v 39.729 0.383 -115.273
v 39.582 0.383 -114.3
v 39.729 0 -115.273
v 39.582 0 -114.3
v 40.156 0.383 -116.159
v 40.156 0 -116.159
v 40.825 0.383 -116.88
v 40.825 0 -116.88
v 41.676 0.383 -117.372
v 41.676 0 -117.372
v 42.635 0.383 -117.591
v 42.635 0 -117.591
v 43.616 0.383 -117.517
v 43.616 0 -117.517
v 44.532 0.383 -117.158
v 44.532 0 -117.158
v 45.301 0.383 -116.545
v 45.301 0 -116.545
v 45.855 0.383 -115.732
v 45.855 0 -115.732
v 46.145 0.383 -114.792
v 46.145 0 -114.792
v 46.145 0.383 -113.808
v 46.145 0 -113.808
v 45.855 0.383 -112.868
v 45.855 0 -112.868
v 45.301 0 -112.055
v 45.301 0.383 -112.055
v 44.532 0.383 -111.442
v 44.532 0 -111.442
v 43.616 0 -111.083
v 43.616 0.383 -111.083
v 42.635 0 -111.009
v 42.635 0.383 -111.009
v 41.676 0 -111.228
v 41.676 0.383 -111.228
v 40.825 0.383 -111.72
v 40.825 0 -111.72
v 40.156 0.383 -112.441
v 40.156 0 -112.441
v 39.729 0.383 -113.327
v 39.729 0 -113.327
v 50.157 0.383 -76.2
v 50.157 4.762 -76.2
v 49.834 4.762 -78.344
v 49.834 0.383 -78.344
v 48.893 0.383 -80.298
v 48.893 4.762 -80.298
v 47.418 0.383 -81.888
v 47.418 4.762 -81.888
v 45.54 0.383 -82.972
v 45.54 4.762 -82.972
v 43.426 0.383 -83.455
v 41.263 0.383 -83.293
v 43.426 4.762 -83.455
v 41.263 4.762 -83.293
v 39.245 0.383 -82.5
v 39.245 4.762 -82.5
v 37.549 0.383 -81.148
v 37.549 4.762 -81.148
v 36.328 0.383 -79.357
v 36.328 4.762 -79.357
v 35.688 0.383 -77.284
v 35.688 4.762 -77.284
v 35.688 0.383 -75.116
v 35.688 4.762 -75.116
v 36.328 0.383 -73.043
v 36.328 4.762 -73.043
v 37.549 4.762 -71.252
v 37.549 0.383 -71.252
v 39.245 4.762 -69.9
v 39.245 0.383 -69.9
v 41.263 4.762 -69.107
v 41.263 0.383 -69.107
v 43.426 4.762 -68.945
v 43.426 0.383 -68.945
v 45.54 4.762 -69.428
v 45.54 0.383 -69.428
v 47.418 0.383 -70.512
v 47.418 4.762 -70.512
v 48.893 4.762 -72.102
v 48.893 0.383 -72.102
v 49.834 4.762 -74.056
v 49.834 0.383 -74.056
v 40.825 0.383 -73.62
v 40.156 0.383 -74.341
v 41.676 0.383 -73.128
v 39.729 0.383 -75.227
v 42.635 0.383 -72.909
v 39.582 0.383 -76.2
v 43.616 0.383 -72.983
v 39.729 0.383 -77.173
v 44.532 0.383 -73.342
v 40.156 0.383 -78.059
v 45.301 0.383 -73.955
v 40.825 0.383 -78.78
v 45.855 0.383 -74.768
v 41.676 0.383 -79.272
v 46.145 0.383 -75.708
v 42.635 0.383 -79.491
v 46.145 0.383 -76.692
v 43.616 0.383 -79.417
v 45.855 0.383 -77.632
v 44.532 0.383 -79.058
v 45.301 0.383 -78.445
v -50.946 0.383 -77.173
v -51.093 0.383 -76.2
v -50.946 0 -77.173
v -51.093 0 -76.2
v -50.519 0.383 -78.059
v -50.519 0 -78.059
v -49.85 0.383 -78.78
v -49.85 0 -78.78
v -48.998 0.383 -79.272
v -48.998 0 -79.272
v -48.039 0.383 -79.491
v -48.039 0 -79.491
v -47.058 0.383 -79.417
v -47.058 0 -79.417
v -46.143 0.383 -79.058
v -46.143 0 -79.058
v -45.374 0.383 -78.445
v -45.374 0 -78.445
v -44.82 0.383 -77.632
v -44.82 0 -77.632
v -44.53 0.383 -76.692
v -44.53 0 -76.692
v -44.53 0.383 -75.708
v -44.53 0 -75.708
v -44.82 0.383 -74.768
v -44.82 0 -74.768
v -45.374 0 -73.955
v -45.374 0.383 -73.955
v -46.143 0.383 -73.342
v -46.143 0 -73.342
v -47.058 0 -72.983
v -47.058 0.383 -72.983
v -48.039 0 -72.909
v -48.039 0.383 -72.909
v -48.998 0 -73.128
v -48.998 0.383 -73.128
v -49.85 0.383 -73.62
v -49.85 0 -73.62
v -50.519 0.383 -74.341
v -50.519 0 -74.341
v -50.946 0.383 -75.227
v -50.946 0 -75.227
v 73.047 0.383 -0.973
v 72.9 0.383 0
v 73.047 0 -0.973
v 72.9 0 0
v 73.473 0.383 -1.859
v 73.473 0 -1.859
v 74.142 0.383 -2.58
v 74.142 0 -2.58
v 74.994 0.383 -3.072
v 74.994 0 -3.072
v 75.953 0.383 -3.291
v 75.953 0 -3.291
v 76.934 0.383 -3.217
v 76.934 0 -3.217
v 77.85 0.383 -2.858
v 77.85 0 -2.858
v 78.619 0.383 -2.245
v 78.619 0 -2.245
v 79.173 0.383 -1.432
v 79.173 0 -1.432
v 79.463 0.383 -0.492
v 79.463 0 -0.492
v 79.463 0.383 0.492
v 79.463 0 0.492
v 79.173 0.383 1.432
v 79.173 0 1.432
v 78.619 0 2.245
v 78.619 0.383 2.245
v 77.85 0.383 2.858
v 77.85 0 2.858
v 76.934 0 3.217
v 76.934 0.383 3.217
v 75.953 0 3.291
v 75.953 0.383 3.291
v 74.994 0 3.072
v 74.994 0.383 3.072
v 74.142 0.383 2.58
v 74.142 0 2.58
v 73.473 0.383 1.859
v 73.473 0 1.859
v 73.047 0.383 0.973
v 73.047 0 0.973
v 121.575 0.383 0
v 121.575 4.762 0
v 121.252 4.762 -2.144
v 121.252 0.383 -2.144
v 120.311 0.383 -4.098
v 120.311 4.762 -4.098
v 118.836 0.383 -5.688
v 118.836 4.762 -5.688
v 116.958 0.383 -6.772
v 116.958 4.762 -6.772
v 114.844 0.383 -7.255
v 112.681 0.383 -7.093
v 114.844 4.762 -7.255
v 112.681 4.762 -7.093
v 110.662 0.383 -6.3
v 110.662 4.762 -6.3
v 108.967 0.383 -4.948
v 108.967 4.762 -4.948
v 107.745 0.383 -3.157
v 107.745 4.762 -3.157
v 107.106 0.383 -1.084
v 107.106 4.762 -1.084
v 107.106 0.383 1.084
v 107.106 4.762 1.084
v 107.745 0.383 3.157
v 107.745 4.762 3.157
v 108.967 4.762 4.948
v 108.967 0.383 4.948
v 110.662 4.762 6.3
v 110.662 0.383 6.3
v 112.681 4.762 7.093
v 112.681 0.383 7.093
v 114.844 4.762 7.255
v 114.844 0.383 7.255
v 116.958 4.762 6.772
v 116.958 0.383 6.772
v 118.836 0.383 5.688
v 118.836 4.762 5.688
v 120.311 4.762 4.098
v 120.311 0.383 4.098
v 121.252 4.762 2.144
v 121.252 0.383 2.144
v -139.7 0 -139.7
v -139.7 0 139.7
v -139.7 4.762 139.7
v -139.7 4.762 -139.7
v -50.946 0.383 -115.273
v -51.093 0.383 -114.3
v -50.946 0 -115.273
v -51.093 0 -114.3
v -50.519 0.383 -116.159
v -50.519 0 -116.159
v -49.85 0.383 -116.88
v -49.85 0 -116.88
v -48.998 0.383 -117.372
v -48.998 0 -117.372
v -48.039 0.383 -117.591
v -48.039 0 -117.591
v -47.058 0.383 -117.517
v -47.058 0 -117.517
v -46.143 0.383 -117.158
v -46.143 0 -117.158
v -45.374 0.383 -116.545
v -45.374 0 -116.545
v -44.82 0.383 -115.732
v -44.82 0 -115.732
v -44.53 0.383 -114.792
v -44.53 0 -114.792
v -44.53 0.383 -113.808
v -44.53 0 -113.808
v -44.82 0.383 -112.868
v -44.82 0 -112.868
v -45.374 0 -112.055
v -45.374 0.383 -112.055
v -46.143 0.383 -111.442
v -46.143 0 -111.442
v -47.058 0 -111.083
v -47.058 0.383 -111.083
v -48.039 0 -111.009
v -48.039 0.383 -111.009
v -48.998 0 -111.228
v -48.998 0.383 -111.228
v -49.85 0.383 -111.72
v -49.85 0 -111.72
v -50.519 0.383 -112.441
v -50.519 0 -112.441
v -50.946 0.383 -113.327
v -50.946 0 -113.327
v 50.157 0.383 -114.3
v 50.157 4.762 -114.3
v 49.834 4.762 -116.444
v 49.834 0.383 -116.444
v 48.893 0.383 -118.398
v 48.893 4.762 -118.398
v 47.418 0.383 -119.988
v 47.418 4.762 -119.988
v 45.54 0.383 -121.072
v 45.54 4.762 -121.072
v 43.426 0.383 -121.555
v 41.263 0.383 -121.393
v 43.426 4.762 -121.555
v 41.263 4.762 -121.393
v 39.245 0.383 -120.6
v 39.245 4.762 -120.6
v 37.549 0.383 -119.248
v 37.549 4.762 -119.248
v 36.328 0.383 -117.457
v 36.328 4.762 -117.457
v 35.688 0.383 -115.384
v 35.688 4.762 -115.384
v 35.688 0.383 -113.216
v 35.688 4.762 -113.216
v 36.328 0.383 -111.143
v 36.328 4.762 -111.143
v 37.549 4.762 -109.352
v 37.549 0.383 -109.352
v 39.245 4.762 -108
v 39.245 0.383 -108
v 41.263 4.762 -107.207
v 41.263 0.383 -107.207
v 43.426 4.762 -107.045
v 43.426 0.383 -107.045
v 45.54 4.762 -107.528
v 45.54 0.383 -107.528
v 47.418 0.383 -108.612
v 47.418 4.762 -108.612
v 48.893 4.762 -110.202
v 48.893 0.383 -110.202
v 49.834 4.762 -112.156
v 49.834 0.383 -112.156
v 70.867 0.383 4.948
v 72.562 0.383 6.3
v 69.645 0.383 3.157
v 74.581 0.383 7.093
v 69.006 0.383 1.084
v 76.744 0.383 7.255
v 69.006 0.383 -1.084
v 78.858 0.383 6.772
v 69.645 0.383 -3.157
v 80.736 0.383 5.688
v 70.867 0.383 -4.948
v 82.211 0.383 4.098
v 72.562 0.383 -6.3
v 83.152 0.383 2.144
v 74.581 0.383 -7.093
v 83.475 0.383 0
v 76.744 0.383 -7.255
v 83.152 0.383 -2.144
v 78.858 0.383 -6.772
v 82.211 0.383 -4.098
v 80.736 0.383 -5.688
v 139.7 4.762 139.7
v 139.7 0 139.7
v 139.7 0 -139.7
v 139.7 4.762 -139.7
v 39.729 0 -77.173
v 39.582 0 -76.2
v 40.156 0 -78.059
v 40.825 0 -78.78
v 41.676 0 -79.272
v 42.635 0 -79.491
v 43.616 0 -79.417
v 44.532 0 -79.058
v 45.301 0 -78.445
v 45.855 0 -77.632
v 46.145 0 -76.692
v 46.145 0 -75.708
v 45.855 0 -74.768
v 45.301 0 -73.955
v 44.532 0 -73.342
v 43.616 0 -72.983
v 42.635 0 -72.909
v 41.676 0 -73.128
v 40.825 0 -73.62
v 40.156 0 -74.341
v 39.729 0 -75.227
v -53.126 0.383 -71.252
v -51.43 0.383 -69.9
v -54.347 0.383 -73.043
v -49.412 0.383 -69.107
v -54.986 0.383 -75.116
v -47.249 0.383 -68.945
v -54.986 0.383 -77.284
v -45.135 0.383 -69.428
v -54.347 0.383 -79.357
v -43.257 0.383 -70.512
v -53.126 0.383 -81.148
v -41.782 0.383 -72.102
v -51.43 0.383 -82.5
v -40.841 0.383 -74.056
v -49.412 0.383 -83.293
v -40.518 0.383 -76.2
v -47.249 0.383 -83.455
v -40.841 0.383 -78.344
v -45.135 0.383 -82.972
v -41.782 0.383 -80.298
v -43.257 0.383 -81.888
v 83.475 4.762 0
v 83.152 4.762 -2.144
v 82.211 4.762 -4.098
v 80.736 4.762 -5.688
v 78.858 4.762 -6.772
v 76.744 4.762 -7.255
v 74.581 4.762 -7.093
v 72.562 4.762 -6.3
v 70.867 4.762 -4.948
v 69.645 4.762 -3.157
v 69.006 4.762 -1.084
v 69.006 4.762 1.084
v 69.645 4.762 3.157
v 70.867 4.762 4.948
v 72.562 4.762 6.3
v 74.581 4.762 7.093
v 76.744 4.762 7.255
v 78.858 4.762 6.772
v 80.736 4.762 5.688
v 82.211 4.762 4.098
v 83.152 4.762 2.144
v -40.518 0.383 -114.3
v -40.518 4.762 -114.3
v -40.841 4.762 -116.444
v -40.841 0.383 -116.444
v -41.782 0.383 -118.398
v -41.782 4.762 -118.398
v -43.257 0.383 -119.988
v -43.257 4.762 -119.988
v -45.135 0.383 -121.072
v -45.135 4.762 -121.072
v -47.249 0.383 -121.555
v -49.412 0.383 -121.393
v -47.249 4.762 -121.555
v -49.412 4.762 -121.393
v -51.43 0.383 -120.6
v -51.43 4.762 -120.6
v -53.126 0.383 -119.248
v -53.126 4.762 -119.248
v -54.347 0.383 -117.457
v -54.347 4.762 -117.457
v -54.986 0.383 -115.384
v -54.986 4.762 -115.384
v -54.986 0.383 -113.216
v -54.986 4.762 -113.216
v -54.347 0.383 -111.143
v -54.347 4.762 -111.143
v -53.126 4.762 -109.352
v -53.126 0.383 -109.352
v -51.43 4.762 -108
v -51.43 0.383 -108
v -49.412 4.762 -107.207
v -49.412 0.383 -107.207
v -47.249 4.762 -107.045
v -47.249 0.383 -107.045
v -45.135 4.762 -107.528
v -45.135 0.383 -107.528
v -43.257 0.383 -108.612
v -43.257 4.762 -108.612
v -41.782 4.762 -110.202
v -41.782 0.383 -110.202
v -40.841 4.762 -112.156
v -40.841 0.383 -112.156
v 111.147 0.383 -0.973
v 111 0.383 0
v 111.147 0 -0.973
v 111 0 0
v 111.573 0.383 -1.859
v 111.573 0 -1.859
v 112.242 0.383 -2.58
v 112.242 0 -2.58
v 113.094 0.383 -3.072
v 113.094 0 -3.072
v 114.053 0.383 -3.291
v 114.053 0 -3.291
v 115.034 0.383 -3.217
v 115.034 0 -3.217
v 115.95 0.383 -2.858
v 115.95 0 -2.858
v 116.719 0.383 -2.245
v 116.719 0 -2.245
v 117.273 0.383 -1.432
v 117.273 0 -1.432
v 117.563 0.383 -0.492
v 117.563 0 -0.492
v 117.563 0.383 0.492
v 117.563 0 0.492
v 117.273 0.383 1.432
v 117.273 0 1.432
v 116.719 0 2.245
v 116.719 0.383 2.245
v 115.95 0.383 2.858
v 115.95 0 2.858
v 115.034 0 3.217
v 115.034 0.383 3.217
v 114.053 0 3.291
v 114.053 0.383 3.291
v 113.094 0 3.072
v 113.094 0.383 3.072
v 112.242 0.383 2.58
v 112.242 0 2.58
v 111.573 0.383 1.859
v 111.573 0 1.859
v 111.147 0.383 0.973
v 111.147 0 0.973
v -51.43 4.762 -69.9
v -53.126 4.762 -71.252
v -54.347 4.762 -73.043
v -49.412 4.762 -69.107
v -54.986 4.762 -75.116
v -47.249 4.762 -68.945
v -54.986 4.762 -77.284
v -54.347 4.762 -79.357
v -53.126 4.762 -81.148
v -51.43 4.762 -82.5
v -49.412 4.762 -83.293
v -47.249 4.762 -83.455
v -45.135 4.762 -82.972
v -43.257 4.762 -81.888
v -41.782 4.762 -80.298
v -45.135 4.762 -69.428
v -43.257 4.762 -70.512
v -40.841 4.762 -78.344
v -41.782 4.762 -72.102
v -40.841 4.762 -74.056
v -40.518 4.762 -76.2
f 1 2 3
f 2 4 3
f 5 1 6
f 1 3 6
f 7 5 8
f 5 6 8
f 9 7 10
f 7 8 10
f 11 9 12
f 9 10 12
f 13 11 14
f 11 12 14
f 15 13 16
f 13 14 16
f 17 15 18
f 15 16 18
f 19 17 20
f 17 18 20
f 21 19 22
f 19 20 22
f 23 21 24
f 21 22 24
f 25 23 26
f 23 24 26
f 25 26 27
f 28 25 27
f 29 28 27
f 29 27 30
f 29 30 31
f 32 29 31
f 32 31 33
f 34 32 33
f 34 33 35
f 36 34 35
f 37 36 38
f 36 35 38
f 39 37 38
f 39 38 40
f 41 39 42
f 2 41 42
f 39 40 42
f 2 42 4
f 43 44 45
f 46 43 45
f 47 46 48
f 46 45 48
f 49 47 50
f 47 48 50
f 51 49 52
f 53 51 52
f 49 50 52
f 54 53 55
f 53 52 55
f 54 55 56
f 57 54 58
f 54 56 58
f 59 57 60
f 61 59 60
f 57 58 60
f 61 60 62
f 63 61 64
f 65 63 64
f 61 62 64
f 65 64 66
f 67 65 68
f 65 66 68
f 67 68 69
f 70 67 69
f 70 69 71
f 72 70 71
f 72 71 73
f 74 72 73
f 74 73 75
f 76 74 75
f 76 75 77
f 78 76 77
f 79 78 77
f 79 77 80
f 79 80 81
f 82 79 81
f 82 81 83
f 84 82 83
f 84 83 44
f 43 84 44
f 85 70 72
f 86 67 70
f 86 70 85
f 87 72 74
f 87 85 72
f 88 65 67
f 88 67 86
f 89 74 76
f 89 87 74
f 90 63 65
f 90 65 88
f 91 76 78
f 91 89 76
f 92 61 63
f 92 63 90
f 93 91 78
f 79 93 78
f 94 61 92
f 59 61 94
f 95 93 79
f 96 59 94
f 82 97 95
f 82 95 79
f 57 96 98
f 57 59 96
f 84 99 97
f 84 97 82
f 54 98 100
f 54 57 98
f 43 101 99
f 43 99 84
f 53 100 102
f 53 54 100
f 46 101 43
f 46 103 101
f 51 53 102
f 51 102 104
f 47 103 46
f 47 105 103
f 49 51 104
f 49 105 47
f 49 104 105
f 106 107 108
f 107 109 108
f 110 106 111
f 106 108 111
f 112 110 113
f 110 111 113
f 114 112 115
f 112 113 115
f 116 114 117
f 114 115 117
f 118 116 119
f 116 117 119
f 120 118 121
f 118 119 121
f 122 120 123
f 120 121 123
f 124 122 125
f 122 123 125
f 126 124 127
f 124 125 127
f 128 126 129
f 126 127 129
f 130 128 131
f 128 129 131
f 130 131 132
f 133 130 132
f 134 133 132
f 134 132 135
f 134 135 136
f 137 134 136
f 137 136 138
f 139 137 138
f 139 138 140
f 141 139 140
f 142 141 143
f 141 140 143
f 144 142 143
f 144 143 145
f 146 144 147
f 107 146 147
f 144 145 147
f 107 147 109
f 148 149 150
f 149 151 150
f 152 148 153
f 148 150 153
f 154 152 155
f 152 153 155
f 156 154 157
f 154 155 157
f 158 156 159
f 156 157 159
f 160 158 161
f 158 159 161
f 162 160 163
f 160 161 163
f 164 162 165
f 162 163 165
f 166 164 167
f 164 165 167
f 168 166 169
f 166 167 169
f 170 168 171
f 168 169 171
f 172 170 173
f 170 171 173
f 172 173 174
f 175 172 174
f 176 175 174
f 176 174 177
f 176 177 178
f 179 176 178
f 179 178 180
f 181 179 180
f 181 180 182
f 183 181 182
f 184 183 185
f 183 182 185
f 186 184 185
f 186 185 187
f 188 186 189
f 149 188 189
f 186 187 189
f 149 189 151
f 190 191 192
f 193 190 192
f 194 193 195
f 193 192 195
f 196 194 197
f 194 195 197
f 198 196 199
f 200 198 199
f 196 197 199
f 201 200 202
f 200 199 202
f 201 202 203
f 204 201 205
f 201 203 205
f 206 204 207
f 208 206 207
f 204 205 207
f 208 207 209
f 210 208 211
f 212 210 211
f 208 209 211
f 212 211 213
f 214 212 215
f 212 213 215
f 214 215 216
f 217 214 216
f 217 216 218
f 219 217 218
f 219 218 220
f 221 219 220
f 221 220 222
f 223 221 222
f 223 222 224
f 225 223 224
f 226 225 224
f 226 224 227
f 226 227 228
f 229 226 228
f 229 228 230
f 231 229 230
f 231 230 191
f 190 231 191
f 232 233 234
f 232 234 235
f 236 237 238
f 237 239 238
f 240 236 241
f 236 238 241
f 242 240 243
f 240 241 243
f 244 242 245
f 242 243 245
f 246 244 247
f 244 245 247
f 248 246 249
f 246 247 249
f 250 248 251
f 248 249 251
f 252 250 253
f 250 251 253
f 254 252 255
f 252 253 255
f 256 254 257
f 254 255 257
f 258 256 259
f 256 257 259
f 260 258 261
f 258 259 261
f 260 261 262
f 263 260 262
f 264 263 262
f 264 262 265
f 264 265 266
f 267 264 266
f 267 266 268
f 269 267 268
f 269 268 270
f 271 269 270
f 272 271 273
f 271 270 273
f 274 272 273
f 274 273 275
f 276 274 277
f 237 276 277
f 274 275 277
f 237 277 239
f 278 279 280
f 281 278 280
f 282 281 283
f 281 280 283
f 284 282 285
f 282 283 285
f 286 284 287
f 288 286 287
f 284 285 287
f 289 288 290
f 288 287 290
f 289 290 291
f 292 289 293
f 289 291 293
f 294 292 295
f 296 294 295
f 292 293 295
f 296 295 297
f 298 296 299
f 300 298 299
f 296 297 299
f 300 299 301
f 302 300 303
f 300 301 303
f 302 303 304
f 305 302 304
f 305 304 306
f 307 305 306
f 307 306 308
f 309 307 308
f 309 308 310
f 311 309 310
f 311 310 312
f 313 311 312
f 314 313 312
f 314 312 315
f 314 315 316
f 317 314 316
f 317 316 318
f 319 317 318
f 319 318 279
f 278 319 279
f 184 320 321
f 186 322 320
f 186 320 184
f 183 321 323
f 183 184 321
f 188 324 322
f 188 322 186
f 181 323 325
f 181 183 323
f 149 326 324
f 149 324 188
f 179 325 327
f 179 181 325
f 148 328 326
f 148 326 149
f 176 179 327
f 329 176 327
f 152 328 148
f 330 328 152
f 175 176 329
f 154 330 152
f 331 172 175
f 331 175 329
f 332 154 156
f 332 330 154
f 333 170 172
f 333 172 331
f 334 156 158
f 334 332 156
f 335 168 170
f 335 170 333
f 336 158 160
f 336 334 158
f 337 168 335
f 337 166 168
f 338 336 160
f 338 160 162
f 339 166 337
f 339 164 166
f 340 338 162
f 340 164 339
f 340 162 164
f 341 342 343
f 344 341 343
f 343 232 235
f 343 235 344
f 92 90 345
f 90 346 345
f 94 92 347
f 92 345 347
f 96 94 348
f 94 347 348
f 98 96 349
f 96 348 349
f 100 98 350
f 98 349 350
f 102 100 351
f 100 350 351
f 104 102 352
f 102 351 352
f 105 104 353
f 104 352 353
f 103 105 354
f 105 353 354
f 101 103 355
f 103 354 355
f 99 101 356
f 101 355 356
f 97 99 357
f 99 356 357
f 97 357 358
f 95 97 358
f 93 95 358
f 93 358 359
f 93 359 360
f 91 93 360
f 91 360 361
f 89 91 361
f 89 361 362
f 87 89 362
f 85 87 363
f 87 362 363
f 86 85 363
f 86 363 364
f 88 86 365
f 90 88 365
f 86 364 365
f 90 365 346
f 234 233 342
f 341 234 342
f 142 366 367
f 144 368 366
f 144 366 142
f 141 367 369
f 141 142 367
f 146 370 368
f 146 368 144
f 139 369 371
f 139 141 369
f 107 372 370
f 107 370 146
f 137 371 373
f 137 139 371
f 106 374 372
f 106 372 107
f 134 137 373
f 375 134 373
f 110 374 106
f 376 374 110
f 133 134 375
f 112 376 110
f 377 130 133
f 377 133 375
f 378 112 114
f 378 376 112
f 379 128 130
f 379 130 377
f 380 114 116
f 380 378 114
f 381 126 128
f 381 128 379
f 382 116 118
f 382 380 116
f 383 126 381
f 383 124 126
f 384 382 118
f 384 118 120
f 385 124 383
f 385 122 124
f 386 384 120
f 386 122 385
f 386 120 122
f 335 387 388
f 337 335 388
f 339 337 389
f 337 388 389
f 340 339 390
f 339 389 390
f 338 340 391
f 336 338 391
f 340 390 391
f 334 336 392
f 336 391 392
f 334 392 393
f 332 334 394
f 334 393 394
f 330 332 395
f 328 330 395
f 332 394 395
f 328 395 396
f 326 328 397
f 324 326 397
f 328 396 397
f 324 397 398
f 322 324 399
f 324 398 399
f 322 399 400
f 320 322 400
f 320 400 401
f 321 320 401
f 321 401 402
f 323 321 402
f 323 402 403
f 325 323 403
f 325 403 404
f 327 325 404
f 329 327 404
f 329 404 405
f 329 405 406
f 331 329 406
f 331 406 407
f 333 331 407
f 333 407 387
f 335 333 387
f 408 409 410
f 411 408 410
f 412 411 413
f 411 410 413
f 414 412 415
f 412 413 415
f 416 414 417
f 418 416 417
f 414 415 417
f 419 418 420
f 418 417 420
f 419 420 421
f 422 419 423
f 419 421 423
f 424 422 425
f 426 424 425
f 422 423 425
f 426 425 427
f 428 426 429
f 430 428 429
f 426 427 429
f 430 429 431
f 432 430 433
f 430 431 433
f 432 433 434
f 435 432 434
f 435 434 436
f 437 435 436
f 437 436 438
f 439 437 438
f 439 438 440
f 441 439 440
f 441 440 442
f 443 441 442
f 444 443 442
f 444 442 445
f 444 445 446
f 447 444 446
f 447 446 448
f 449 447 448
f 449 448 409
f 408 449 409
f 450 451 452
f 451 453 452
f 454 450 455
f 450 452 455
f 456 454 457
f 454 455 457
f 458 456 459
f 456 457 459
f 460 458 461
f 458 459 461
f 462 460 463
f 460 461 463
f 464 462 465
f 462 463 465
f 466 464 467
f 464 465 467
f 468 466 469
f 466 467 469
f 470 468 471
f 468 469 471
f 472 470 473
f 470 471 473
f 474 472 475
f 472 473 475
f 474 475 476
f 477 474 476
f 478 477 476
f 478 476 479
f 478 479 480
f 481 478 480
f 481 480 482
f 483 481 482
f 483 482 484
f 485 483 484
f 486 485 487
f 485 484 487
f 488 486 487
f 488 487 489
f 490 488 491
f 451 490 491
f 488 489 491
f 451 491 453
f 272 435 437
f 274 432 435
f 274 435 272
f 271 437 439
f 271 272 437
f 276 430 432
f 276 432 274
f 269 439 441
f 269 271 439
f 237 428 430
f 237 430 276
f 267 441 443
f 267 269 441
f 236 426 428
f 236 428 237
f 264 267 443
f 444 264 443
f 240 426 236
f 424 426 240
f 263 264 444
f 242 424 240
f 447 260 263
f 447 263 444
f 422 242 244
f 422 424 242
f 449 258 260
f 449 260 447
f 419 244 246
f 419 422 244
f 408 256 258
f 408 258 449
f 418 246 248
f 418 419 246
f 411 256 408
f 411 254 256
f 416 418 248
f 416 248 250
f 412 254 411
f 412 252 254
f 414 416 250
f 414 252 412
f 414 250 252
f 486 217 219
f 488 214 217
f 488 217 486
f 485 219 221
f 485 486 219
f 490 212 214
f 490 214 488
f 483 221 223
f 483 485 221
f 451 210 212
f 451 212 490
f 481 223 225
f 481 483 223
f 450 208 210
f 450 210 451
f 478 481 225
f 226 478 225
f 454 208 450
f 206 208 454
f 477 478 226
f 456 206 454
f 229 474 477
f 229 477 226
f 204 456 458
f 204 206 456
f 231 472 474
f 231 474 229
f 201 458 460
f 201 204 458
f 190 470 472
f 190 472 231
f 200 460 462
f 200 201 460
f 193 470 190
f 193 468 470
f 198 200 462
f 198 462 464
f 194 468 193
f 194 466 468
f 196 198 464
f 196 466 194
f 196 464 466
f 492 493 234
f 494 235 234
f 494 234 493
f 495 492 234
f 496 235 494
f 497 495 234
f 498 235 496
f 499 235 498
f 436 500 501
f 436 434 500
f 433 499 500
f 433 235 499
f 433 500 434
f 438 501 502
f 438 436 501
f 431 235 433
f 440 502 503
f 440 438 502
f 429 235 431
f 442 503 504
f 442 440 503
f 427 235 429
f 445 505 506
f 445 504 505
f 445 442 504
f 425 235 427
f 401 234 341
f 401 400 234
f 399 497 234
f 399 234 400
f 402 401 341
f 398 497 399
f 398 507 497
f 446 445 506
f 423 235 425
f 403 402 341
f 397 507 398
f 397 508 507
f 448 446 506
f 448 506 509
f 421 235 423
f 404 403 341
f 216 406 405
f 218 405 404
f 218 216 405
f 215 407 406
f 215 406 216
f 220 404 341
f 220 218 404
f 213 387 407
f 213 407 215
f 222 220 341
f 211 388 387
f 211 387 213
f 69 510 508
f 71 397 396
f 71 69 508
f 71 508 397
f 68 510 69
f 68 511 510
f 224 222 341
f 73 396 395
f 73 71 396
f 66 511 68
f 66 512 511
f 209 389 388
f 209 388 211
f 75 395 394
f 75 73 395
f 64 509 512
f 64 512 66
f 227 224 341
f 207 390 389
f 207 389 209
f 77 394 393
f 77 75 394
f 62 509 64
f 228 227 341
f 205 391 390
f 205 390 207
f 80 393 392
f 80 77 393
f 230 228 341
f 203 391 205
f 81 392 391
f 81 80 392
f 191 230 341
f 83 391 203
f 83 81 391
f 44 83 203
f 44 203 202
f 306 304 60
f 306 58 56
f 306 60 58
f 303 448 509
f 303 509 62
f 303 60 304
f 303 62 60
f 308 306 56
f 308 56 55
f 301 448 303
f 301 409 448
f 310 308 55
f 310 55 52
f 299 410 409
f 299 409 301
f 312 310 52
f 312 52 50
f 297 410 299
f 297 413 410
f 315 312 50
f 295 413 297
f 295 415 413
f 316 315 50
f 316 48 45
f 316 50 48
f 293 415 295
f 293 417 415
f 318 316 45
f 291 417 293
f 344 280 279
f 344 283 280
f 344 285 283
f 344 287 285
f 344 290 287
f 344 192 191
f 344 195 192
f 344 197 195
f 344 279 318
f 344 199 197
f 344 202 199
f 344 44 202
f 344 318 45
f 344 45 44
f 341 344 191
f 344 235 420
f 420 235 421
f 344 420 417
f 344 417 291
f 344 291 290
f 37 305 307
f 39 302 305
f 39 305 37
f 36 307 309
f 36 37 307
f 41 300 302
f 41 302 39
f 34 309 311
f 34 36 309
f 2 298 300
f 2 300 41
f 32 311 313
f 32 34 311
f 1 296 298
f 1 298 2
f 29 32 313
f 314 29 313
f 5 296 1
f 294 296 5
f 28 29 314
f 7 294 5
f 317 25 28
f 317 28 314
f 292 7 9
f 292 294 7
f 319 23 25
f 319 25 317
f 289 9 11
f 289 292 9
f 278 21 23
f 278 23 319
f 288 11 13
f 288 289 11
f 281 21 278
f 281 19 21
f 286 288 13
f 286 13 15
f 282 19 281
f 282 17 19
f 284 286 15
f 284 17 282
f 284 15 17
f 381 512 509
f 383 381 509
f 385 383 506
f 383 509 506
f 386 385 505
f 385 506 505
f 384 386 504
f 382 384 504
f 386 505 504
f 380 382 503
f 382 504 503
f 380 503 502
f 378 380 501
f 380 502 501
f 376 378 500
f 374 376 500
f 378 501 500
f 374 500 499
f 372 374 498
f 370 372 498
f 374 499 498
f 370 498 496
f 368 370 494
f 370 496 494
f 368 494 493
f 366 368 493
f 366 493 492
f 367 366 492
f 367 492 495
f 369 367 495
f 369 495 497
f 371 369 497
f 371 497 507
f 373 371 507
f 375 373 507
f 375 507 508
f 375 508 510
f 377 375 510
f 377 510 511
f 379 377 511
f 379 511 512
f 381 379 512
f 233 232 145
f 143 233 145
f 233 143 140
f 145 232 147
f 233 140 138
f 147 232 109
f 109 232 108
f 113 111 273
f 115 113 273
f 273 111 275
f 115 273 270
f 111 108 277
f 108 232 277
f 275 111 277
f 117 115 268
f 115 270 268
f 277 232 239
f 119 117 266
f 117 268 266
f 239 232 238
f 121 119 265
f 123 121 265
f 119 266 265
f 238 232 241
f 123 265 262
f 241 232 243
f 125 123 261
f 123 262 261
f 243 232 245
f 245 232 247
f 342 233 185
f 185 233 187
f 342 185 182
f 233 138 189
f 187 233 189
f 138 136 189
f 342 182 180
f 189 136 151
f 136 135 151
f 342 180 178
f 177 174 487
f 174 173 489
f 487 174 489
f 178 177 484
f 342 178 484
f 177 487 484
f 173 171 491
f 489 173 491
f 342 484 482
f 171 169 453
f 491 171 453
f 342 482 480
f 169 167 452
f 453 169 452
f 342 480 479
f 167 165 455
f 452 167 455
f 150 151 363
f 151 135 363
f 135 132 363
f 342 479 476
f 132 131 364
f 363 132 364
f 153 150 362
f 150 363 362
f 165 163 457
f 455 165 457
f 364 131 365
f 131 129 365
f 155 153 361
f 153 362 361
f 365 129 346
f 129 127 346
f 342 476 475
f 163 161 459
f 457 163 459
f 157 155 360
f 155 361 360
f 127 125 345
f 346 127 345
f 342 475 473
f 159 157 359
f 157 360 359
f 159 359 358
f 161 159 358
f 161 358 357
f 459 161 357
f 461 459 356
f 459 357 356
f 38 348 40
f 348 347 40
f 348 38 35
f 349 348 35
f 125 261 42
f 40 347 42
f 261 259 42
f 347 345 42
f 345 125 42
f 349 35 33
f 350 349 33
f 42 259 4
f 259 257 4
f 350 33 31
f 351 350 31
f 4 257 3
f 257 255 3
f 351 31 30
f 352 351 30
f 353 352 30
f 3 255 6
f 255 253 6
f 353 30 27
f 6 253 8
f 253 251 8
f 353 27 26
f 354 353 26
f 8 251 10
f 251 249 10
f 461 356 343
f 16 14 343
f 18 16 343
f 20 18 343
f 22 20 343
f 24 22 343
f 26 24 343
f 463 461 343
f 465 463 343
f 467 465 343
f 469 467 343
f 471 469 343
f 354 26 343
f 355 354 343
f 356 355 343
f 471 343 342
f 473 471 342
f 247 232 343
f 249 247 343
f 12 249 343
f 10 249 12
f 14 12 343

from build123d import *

# Parameters (mm, degrees)
SKETCH1_W                               = 279.4
SKETCH1_H                               = 279.4
BOSS_EXTRUDE1_DEPTH                     = 4.7625
CBORE_FOR_M6_HEX_HEAD_BOLT1_D           = 6.6
CBORE_FOR_M6_HEX_HEAD_BOLT1_CBORE_D     = 14.55
CBORE_FOR_M6_HEX_HEAD_BOLT1_CBORE_DEPTH = 4.38


with BuildPart() as part:
    # Sketch1 → Boss-Extrude1 (new body)
    with BuildSketch(Plane(origin=(0, 0, 0), x_dir=(1, 0, 0), z_dir=(0, 1, 0))):
        Rectangle(SKETCH1_W, SKETCH1_H)
    extrude(amount=BOSS_EXTRUDE1_DEPTH)

    # CBORE for M6 Hex Head Bolt1 (through all)
    with Locations(Plane(origin=(0, 4.7625, 0), x_dir=(1, 0, 0), z_dir=(0, 1, 0))):
        with Locations((-47.792708387, 76.2), (42.882092114, 76.2), (-47.792708387, 114.3), (42.882092114, 114.3), (76.2, 0), (114.3, 0)):
            CounterBoreHole(CBORE_FOR_M6_HEX_HEAD_BOLT1_D / 2, CBORE_FOR_M6_HEX_HEAD_BOLT1_CBORE_D / 2, CBORE_FOR_M6_HEX_HEAD_BOLT1_CBORE_DEPTH)


solid = part.part
